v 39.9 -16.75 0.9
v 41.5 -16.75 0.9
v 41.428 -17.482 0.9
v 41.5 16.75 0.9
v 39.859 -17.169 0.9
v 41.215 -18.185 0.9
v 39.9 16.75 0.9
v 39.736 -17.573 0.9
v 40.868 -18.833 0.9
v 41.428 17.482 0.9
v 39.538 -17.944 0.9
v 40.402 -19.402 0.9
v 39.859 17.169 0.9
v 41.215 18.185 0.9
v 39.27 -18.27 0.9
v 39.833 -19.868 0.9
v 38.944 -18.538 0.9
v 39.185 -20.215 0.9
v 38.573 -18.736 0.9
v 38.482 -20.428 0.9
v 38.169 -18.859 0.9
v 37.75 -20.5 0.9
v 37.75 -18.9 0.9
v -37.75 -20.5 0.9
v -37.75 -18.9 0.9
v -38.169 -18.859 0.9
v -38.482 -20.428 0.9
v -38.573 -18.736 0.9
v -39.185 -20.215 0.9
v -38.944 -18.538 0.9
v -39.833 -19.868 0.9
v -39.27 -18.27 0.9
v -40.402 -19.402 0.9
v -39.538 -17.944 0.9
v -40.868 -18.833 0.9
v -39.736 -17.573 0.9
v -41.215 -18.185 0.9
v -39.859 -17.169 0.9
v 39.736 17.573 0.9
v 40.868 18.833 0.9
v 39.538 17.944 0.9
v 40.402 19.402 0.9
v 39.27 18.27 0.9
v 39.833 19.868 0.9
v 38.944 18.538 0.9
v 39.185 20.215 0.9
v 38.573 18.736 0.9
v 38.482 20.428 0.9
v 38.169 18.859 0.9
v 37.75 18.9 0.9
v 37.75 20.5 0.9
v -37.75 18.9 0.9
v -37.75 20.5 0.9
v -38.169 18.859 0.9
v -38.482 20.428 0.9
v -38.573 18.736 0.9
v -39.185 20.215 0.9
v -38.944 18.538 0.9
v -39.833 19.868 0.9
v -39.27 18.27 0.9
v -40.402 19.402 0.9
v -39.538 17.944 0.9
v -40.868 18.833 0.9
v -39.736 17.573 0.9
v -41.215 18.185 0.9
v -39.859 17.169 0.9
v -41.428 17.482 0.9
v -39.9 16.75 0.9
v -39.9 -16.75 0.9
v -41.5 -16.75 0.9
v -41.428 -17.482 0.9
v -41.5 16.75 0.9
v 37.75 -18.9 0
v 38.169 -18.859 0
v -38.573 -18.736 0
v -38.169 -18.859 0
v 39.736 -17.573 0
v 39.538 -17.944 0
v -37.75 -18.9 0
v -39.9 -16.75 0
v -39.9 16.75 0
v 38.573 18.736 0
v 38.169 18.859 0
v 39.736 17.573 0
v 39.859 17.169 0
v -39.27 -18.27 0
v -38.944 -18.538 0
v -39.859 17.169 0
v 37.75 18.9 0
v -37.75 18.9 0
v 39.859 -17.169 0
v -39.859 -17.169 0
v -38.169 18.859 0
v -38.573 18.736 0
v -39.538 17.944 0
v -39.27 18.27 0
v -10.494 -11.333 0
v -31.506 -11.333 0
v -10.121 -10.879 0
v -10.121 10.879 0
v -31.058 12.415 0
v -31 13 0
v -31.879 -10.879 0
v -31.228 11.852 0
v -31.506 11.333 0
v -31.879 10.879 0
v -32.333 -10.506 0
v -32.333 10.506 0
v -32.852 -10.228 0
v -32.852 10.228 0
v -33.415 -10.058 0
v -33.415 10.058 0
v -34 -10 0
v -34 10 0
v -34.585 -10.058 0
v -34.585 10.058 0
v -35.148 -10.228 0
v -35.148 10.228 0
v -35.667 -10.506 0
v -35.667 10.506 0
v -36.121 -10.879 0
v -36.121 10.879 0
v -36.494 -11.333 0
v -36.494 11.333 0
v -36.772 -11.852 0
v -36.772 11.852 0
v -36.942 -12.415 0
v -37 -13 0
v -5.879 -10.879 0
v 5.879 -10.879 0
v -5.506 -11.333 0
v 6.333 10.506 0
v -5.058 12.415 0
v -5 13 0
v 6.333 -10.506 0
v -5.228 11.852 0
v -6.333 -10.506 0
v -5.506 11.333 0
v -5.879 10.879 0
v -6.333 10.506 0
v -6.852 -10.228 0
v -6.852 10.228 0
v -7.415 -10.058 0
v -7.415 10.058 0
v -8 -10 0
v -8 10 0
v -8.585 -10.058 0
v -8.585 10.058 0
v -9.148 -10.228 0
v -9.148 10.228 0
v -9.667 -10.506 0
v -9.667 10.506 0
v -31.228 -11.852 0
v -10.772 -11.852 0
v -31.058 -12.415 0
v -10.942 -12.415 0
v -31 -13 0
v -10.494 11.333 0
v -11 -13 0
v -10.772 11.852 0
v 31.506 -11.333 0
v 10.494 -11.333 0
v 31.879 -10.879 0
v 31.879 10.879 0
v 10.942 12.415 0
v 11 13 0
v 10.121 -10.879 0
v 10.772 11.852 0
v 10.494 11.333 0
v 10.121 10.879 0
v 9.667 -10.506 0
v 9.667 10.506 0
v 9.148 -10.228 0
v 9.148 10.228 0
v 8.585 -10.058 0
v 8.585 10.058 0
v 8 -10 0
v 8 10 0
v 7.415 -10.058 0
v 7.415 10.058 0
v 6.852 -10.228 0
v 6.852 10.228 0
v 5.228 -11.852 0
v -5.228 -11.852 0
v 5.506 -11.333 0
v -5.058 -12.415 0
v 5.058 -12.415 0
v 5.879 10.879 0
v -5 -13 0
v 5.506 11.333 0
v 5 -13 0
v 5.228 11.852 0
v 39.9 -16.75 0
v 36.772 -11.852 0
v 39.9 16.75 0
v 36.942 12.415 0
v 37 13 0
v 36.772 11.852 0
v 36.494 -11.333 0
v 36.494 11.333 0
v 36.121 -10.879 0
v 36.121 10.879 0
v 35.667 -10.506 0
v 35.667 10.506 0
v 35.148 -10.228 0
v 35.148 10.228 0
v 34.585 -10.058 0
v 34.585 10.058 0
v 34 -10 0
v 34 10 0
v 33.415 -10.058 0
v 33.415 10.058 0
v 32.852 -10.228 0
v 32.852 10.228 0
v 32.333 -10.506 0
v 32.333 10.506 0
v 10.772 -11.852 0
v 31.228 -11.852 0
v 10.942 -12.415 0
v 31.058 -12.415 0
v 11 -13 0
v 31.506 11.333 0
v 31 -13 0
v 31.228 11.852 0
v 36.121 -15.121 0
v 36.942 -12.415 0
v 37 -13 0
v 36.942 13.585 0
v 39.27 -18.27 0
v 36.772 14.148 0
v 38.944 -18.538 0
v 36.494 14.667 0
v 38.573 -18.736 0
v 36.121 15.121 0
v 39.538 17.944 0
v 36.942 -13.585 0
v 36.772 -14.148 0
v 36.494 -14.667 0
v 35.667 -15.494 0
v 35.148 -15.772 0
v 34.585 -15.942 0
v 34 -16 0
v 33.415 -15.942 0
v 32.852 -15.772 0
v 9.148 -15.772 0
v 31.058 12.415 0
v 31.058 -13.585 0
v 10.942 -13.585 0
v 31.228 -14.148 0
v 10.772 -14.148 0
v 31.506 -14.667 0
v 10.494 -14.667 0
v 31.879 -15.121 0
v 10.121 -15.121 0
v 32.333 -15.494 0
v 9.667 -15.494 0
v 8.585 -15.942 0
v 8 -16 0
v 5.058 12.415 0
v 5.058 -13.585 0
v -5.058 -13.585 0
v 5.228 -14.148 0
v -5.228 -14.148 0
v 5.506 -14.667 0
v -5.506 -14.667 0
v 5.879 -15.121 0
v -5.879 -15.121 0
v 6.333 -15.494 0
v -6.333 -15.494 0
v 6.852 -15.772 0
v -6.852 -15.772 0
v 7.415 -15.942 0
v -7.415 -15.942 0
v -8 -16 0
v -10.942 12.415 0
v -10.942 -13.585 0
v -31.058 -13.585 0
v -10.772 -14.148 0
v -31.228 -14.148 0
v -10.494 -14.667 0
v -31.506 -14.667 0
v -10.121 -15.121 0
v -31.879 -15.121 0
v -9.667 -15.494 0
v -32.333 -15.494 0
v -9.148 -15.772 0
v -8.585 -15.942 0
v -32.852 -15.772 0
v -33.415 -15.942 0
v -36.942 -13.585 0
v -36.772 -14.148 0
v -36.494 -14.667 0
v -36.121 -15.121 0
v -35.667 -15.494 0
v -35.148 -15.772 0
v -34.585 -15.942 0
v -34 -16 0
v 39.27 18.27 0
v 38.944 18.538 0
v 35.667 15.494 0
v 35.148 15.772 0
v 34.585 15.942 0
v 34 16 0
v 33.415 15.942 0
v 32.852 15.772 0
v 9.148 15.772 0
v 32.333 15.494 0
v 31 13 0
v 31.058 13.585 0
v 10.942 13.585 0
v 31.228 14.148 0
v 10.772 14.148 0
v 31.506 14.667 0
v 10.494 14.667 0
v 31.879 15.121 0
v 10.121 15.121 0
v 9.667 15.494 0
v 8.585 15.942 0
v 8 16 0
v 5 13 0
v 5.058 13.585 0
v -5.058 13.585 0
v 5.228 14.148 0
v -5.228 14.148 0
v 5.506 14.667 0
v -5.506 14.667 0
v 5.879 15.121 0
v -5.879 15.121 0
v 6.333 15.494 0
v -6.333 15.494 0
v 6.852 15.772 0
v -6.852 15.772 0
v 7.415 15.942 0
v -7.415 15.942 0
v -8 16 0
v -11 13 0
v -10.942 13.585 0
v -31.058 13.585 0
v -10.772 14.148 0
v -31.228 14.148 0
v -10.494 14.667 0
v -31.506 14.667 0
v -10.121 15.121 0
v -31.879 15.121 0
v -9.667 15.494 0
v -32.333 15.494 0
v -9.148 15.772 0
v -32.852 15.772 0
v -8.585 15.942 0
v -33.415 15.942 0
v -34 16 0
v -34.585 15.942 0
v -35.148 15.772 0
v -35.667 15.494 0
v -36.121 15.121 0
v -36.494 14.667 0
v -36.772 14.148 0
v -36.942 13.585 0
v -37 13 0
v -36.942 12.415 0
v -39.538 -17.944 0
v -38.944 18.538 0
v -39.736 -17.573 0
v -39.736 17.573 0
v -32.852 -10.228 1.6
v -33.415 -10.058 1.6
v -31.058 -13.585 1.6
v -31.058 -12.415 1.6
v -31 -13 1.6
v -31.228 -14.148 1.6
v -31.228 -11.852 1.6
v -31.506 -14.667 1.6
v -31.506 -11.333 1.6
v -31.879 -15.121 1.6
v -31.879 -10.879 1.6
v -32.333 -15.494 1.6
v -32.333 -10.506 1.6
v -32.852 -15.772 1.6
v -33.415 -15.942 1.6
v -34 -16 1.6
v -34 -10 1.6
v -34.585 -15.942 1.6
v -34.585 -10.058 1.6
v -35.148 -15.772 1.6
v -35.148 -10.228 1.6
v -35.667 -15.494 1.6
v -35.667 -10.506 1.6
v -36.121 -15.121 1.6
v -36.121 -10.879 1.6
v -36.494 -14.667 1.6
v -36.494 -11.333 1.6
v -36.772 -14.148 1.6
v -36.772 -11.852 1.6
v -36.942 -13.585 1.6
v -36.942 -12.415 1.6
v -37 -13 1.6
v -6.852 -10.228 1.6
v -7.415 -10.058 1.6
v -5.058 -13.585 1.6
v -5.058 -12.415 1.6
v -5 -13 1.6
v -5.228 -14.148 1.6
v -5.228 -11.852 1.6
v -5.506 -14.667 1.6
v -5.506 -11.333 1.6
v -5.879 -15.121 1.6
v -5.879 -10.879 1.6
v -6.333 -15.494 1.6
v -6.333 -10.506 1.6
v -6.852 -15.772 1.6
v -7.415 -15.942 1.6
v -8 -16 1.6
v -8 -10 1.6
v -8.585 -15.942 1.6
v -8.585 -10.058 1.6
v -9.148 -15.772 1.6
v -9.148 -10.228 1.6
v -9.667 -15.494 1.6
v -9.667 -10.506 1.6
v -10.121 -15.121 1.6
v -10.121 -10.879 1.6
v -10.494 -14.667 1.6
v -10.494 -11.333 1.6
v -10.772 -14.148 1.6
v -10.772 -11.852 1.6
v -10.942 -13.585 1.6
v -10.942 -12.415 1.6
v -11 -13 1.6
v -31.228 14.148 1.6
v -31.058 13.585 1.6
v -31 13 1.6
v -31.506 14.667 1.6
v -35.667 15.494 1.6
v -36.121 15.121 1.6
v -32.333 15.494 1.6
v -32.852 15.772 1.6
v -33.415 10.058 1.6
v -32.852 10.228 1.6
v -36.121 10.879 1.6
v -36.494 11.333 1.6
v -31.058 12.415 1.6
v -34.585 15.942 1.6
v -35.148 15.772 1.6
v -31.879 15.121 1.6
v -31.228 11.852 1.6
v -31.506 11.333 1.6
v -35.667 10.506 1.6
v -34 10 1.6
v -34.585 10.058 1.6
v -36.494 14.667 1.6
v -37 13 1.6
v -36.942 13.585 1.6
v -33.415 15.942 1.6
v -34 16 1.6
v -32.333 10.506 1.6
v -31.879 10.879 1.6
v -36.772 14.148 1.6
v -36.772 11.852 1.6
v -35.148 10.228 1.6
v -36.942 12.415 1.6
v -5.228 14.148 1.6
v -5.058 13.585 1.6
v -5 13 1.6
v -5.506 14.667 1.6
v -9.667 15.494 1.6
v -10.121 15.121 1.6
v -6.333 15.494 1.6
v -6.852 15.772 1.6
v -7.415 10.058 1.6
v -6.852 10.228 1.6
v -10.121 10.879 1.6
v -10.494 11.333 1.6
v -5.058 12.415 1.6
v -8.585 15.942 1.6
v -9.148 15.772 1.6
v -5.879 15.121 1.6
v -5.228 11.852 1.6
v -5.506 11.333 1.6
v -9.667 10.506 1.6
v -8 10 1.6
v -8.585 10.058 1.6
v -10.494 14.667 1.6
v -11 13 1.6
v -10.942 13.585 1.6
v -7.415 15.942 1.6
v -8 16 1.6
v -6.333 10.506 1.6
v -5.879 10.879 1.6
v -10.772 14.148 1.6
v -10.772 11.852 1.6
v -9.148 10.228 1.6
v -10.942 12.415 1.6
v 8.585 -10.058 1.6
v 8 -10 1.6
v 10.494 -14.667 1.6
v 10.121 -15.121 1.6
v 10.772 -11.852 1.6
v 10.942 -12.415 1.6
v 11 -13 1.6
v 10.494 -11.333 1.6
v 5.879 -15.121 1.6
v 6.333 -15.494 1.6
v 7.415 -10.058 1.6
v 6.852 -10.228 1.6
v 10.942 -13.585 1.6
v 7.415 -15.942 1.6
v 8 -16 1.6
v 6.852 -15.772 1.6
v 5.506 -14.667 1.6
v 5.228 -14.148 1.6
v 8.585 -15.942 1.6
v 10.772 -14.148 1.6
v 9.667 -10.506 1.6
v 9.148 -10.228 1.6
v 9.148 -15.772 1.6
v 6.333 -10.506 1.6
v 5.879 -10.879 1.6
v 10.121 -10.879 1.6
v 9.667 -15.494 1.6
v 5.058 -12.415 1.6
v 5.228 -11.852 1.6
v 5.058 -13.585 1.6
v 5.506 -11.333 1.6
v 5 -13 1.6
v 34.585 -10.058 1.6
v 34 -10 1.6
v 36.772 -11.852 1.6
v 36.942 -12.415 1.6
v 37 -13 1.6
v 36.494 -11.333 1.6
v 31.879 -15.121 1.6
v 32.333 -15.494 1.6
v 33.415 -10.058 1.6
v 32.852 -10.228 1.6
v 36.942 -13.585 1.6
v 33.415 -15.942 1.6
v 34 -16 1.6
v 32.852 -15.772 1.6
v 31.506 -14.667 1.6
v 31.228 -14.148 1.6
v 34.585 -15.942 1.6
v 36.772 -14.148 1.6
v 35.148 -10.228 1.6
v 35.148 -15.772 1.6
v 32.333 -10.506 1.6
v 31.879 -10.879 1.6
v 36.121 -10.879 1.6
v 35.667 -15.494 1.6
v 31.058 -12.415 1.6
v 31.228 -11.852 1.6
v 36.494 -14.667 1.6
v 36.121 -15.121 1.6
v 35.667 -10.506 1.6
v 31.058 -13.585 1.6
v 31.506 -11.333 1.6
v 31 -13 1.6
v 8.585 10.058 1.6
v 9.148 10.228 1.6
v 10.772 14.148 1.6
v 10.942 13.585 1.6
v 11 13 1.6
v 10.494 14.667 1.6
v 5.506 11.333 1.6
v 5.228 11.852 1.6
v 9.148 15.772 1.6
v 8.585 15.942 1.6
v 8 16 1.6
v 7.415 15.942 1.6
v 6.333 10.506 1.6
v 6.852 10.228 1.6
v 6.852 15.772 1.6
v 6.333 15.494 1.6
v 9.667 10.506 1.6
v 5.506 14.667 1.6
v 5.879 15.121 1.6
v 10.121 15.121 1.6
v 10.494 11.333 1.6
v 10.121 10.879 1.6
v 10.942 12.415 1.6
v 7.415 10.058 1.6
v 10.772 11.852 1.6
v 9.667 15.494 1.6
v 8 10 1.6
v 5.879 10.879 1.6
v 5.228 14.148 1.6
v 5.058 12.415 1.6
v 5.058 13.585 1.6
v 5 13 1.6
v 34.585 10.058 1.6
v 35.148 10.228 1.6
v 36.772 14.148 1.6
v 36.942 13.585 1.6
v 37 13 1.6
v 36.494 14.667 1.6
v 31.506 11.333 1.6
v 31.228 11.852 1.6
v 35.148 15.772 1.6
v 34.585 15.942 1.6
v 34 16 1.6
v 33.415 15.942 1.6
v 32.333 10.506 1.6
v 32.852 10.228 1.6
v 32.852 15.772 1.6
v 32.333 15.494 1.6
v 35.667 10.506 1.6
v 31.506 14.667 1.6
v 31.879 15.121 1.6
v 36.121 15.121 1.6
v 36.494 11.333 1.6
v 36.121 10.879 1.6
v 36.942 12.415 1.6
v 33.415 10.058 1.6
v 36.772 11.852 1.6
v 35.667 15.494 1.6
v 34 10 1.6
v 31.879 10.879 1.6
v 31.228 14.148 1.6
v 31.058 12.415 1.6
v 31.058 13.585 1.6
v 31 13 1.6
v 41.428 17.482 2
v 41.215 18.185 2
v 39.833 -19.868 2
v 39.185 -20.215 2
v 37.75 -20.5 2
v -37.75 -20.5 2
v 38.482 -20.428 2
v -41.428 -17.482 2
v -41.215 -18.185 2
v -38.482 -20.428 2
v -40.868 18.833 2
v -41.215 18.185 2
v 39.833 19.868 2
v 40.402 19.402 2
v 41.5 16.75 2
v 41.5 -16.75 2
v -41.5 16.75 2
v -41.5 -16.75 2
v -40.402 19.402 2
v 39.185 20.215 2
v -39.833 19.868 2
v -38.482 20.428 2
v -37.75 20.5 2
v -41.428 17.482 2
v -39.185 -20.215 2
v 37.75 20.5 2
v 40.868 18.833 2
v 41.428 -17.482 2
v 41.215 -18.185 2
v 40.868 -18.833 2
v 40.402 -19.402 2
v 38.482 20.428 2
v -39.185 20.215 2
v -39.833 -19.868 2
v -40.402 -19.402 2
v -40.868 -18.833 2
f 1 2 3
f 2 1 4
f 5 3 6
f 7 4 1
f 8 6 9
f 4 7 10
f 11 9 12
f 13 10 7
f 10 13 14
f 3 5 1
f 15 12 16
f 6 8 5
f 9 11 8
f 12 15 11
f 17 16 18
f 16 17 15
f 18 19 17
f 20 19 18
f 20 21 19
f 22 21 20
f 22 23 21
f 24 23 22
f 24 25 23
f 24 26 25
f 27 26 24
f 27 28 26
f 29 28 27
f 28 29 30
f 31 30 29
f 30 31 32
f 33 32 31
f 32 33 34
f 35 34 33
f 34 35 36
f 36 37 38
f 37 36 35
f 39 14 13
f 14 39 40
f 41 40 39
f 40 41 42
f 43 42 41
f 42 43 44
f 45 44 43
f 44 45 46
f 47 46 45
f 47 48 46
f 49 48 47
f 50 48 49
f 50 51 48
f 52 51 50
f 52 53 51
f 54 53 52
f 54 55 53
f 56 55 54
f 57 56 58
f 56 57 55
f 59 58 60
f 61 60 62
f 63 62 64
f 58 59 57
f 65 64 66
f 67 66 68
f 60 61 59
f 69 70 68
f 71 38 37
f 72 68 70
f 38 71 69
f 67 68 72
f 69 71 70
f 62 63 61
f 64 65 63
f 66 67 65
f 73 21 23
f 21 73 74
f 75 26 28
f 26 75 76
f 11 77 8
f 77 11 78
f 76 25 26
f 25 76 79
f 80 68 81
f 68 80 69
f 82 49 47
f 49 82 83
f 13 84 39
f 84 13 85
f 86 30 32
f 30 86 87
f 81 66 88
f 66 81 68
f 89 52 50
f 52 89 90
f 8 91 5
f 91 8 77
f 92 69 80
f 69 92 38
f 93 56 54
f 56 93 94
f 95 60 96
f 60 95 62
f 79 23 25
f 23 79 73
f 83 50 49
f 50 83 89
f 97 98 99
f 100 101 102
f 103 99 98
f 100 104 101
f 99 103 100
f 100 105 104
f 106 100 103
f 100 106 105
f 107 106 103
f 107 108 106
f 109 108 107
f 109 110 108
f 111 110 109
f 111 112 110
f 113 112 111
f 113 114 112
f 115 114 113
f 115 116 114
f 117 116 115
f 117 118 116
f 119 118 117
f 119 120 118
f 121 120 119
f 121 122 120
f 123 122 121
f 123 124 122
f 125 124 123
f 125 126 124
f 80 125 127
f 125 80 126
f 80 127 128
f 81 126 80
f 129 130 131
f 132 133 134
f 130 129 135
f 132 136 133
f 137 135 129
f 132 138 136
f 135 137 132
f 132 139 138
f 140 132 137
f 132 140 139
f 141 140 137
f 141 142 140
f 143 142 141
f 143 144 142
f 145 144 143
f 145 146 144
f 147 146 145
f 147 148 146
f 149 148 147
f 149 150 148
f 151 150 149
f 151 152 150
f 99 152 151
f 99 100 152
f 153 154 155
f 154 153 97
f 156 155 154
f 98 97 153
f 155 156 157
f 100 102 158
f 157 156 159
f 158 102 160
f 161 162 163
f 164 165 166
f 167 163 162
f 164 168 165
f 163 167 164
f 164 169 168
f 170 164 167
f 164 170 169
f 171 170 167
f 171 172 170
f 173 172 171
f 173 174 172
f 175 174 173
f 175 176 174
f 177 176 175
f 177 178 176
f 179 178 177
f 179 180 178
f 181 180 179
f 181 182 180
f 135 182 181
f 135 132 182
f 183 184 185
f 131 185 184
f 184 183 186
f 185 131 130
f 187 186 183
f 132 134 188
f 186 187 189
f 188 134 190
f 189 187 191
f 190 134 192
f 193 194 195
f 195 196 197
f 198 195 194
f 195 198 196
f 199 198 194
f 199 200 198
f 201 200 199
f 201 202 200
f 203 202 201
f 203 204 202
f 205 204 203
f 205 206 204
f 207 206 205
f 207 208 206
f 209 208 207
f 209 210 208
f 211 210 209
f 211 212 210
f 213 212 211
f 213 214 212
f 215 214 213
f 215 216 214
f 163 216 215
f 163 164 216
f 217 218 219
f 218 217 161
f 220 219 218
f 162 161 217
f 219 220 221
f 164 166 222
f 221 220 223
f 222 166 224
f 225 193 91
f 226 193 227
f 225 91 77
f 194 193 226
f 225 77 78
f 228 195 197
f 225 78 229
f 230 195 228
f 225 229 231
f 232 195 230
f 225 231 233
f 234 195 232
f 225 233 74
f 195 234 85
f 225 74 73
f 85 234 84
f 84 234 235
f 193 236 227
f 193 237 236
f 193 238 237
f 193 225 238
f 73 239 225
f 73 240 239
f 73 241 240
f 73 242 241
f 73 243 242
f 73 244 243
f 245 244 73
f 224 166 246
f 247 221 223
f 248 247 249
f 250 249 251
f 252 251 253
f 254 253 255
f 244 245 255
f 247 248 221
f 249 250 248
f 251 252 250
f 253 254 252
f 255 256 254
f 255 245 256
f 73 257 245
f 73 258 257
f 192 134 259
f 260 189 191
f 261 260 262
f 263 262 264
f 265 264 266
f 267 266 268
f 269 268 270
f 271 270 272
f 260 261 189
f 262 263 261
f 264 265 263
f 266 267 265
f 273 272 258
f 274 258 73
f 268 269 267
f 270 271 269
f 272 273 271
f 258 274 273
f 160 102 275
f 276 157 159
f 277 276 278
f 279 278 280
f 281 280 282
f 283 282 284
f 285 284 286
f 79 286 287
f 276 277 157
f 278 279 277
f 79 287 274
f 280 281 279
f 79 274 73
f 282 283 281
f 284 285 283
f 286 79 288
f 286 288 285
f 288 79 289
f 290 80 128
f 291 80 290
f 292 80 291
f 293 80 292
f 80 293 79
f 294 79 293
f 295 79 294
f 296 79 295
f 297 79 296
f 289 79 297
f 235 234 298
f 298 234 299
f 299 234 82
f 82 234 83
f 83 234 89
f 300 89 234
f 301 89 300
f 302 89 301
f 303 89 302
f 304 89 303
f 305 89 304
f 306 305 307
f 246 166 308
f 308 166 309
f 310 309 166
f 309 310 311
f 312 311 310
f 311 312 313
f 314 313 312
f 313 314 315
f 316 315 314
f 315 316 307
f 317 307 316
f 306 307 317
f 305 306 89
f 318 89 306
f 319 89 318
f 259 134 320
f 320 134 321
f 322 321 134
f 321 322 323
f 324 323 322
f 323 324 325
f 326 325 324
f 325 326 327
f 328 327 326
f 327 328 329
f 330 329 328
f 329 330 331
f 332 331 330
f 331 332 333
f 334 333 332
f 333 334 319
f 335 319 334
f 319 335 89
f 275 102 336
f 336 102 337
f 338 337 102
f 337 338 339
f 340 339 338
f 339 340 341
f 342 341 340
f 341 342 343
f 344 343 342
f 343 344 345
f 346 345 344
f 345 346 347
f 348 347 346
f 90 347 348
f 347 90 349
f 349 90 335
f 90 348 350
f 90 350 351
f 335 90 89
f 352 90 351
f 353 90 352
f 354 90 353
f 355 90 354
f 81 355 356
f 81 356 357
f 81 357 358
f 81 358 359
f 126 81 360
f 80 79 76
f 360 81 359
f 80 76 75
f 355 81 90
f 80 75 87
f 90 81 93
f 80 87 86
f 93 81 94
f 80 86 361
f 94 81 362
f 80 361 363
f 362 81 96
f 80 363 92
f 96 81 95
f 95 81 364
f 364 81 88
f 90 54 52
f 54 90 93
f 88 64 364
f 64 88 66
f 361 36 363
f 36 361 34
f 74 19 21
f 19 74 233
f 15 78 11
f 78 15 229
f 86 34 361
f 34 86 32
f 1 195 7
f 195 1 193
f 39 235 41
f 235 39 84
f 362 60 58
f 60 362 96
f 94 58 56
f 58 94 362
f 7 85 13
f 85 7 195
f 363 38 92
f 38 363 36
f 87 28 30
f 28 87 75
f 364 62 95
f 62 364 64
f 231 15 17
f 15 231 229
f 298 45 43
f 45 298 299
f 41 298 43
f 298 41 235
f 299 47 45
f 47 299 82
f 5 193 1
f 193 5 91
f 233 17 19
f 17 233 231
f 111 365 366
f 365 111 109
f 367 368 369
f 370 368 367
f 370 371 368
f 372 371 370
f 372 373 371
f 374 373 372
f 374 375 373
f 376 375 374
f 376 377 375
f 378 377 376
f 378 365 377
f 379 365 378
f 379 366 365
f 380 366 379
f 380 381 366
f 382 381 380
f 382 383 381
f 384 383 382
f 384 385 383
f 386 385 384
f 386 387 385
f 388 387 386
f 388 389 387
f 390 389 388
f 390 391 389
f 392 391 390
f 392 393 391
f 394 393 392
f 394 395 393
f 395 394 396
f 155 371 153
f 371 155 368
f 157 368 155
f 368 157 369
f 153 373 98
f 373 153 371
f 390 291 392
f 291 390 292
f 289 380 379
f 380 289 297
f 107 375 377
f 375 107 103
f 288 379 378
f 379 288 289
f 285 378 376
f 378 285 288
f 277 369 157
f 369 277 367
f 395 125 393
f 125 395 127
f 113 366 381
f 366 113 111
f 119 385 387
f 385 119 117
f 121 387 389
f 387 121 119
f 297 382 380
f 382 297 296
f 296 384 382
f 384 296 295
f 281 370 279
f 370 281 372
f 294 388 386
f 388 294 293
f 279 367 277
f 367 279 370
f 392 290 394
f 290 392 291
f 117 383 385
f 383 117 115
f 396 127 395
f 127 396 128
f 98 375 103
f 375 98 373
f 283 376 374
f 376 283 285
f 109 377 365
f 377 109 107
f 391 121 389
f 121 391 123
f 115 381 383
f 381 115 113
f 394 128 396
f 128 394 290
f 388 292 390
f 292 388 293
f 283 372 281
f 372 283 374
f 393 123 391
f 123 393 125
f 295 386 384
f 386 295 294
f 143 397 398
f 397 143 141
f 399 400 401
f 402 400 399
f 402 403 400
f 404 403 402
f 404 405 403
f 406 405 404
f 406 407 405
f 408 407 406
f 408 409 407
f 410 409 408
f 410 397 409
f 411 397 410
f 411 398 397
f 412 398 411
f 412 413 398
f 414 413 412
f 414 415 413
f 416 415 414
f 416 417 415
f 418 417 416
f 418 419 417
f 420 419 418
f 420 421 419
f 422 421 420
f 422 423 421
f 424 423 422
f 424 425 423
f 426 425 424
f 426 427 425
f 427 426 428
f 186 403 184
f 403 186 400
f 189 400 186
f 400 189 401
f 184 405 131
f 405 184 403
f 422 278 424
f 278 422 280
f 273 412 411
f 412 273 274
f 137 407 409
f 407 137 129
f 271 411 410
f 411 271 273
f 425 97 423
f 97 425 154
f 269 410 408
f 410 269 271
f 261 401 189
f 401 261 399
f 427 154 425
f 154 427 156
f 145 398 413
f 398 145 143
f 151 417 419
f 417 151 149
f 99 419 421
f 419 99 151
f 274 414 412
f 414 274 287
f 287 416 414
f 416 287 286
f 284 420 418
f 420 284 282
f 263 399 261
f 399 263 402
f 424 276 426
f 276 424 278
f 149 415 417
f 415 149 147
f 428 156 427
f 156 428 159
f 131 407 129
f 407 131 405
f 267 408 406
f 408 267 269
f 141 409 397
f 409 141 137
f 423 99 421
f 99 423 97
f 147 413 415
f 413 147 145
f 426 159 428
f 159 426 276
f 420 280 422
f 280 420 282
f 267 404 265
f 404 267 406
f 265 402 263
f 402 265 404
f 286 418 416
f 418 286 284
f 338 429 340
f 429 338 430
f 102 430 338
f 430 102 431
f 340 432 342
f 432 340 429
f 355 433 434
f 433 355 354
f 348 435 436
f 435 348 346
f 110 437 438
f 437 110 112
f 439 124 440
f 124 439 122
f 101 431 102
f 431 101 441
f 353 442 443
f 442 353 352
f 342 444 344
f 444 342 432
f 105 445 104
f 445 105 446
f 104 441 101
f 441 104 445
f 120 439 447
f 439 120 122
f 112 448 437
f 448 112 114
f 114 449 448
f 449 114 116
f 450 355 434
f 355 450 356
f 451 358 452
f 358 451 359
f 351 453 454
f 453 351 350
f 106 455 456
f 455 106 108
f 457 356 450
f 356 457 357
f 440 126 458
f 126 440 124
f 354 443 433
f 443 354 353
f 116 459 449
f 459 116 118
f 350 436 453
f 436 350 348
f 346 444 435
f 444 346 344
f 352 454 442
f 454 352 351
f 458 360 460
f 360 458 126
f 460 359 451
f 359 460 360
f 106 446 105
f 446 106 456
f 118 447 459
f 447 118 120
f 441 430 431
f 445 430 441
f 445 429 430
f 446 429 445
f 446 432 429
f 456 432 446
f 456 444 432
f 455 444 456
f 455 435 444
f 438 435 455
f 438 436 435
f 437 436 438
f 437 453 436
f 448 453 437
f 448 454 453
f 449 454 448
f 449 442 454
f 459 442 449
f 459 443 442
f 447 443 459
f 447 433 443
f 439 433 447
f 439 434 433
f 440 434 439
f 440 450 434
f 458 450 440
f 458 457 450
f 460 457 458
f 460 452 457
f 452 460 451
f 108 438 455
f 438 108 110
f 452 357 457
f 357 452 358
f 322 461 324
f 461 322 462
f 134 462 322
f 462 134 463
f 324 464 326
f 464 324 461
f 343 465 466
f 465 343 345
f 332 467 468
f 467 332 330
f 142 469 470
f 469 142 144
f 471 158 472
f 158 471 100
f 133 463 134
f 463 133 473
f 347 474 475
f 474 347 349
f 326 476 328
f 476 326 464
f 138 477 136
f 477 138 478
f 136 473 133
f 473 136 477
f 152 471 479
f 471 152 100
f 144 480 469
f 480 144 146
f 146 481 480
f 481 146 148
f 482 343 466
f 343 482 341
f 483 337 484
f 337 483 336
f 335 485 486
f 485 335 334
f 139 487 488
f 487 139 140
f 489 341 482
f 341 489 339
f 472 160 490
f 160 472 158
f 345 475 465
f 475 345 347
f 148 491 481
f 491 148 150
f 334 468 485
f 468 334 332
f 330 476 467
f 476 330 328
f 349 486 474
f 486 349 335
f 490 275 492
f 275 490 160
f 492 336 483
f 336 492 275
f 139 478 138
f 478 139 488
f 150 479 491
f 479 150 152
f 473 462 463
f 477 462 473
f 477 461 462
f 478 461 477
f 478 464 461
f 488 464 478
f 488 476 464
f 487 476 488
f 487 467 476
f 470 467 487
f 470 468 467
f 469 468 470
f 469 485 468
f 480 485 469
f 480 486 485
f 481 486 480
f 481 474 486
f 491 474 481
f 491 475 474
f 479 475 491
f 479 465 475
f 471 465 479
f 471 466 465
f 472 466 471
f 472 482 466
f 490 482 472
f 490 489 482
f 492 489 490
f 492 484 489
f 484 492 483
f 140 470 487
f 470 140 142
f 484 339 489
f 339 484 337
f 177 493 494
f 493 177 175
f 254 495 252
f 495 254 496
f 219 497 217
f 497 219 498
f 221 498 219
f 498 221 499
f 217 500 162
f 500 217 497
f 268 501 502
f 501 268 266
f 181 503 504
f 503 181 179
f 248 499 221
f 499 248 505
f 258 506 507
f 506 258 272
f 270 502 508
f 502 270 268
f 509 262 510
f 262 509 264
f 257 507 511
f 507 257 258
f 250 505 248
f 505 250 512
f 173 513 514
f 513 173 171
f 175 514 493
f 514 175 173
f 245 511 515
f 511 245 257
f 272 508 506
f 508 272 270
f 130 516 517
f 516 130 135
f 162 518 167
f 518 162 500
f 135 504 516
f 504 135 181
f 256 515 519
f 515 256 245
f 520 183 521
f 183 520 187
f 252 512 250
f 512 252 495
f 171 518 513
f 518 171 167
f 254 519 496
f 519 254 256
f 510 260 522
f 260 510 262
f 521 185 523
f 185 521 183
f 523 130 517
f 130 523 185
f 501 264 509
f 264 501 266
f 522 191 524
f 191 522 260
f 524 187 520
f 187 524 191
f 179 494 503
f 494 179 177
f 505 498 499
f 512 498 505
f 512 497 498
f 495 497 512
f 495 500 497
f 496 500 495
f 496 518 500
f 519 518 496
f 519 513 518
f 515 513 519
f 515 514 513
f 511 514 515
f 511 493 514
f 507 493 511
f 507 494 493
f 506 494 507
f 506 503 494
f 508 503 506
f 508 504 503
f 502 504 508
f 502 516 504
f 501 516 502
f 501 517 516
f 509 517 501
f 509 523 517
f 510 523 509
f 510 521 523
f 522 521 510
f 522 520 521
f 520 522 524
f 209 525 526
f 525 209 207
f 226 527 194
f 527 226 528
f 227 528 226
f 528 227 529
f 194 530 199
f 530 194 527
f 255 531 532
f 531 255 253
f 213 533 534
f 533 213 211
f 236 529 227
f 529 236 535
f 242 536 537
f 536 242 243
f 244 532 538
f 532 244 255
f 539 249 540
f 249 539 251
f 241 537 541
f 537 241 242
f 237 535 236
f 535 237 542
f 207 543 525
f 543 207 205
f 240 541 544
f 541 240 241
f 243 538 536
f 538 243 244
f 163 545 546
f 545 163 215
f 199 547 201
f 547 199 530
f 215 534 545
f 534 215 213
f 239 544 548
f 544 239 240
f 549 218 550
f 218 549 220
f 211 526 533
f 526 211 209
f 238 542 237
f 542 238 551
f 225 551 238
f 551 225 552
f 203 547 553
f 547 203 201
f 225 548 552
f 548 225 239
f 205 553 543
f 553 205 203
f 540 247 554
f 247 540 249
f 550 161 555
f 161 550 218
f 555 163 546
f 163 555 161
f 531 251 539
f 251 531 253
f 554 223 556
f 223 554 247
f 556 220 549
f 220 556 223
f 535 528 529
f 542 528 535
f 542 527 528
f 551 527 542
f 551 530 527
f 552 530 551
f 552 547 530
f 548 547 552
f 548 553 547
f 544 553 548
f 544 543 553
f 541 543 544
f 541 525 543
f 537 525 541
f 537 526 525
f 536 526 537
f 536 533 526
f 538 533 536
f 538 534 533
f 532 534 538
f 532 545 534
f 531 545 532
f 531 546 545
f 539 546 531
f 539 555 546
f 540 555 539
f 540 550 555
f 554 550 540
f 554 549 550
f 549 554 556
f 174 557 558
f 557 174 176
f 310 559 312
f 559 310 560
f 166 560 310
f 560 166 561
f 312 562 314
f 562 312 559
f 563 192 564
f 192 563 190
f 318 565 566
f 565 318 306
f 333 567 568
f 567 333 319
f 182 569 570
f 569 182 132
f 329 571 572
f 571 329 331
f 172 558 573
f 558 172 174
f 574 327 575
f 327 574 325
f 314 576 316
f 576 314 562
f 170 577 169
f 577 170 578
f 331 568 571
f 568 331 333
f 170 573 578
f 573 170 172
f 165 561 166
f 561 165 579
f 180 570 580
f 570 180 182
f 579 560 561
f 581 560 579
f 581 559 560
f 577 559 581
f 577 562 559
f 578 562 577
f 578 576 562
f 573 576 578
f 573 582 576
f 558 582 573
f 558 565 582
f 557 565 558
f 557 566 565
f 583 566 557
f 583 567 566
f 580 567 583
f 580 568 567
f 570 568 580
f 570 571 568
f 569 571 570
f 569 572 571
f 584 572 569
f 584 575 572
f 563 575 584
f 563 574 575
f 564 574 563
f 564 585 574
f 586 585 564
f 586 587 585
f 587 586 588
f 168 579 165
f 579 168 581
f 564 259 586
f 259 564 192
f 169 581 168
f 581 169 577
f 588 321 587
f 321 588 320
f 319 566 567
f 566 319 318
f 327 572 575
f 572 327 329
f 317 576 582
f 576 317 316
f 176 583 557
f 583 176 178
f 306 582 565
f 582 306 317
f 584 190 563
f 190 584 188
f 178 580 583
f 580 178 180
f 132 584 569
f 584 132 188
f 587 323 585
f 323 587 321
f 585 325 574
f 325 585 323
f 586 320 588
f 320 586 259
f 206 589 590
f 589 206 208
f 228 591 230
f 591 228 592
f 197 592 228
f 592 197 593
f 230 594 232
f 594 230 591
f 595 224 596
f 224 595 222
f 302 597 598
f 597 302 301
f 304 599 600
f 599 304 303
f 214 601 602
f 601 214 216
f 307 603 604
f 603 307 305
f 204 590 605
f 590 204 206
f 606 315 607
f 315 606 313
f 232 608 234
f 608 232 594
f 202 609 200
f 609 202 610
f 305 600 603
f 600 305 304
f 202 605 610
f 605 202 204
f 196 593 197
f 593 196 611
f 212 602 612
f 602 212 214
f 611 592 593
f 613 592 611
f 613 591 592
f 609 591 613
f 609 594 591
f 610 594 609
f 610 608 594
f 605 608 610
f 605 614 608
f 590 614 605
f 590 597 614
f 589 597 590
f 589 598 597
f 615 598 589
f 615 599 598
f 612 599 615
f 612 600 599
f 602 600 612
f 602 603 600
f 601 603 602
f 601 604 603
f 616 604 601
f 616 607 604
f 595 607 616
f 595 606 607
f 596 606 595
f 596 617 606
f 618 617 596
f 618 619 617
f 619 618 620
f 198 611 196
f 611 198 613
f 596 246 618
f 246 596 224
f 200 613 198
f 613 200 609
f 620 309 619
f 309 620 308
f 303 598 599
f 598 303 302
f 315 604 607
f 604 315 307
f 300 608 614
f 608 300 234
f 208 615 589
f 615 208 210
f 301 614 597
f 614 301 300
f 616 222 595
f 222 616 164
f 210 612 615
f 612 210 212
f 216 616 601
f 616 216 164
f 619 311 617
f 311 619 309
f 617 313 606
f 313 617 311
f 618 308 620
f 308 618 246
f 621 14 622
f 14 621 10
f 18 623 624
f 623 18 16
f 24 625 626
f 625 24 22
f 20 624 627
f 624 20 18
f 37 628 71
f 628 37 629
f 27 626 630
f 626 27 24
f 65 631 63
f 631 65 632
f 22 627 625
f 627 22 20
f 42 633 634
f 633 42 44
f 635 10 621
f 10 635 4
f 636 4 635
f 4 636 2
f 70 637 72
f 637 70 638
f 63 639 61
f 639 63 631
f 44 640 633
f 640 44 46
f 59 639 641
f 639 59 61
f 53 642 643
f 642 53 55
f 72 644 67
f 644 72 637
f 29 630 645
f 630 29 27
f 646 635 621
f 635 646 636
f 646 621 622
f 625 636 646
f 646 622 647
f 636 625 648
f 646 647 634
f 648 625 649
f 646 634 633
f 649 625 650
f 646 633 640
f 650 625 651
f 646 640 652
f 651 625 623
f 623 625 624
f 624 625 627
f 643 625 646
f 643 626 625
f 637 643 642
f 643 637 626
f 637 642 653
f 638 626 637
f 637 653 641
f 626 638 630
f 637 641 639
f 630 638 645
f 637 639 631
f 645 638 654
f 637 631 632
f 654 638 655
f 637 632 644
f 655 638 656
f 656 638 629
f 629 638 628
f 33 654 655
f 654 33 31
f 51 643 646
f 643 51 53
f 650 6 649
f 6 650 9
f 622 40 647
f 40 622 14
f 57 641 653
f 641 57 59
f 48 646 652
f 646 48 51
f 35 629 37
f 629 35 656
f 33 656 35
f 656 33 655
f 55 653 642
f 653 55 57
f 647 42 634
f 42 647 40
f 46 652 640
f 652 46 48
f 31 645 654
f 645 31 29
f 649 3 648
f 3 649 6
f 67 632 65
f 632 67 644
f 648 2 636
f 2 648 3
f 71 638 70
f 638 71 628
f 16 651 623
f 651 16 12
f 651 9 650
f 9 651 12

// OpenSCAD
// file: gridfinity_std.scad
// ============================================================================
// gridfinity_std.scad — shared Gridfinity geometry for the OpenSCAD-engine
// modes of the `gridfinity` cartridge (cup / baseplate_scad / lid).
//
// CLEAN-ROOM PROVENANCE
//   Authored by Innovaciones MADFAM for the MADFAM Open Commons Hyperobjects
//   collection under CERN-OHL-W-2.0. Written from the publicly documented
//   Gridfinity specification (gridfinity.xyz, Zack Freedman / Voidstar Lab)
//   and from a recorded measurement baseline of the cartridge's own manifest
//   contract. No prior implementation of Gridfinity — in this repository, in
//   any archived satellite, or upstream — was read, consulted or copied while
//   writing this file. See ../NOTICE and docs/CLEANROOM-VERIFICATION.md.
//
// THE STANDARD IMPLEMENTED HERE
//   Grid module      42.0 mm in X and Y; one "unit" of footprint.
//   Height unit       7.0 mm in Z.
//   Bin footprint    42*n - 0.5 mm  (0.5 mm total clearance per pitch, so
//                    neighbouring bins in a drawer do not bind).
//   Corner radius     3.75 mm at the widest point of the profile.
//   Base profile     a three-step chamfer stack, bottom-up:
//                        0.80 mm chamfer at 45 deg
//                        1.80 mm straight wall
//                        2.15 mm chamfer at 45 deg
//                    = 4.75 mm; each 45 deg chamfer narrows the section by its
//                    own height on every side, so for a 41.5 mm cell the
//                    sections are 35.6 / 37.2 / 37.2 / 41.5 mm.
//   Foot height       5.00 mm: the 4.75 mm profile plus a 0.25 mm straight
//                    riser at full width, which is where the body starts.
//   Stacking lip     the same profile repeated at the top of a bin, so the
//                    foot of the bin above nests into it.
//   Socket clearance 0.25 mm nominal (0.125 mm per side), so a foot topping
//                    out at 41.5 mm enters a 41.75 mm socket mouth and the
//                    sockets of adjacent cells keep a 0.25 mm rib between them.
//   Magnet socket     6 mm dia x 2 mm deep, on a 26 x 26 mm square about the
//                    cell centre.
//   Screw hole       M3 clearance (3.4 mm), coaxial with the magnet sockets.
// ============================================================================

// No library include. Every primitive this cartridge needs — a rounded
// rectangle, a hull between two sections, a cylinder — is an OpenSCAD builtin,
// so the three modes render with nothing on OPENSCADPATH. BOSL2 (BSD-2-Clause)
// is available in the commons at libs/BOSL2 and would have been permitted, but
// declaring a dependency this code does not use would be a false statement
// about what it needs.

// -- Canonical constants -----------------------------------------------------
GF_PITCH        = 42.0;   // grid module, X and Y
GF_ZUNIT        =  7.0;   // height unit
GF_CLEAR        =  0.5;   // total bin clearance per pitch
GF_CELL         = GF_PITCH - GF_CLEAR;   // 41.5 mm, the bin's per-cell width
GF_R            =  3.75;  // corner radius at the widest section

GF_C1           =  0.80;  // lower chamfer height (45 deg)
GF_WALL         =  1.80;  // middle straight section
GF_C2           =  2.15;  // upper chamfer height (45 deg)
GF_PROFILE_H    = GF_C1 + GF_WALL + GF_C2;   // 4.75 mm
GF_RISER        =  0.25;  // straight riser above the profile
GF_FOOT_H       = GF_PROFILE_H + GF_RISER;   // 5.00 mm

GF_SOCKET_CLEAR =  0.125; // per side; 0.25 mm nominal diametral clearance

GF_MAG_D        =  6.0;   // magnet diameter
GF_MAG_H        =  2.0;   // magnet depth
GF_MAG_PITCH    = 26.0;   // magnet centres, square about the cell centre
GF_SCREW_D      =  3.4;   // M3 clearance

GF_LID_CLEAR    =  1.0;   // total lid clearance per pitch -> 42*n - 1.0

// Resolve the manifest's `fn` parameter. The manifest documents 0 as "auto";
// auto is 32, the value the platform's other rounded cartridges use.
function gf_fn(fn) = fn > 0 ? fn : 32;

// -- Rounded-rectangle prism -------------------------------------------------
// A prism of size [x, y] and height h, base at z = 0, centred in X and Y, with
// vertical edges filleted to radius r. r is clamped so it can never exceed half
// the shorter side.
module gf_rrect(x, y, h, r) {
    rr = max(0.01, min(r, min(x, y) / 2 - 0.001));
    linear_extrude(height = max(0.001, h))
        offset(r = rr) offset(r = -rr)
            square([max(0.02, x), max(0.02, y)], center = true);
}

// -- The base profile as a solid of revolution-free extrusion ----------------
// One cell's foot, base at z = 0, built as four stacked sections. `grow` widens
// every section on each side (used to make the baseplate socket, which is this
// same profile enlarged by the clearance).
//
//   z 0.00 .. 0.80   chamfer: (top - 2*C2 - 2*C1) -> (top - 2*C2)
//   z 0.80 .. 2.60   straight at (top - 2*C2)
//   z 2.60 .. 4.75   chamfer: (top - 2*C2) -> top
//   z 4.75 .. 5.00   straight at top
//
// The corner radius tracks the width so the fillet keeps a constant offset from
// the corner: r shrinks by the same amount the section does.
module gf_foot_profile(grow = 0, with_riser = true) {
    w_top = GF_CELL      + 2 * grow;
    w_mid = w_top - 2 * GF_C2;
    w_bot = w_mid - 2 * GF_C1;

    r_top = GF_R          + grow;
    r_mid = max(0.01, r_top - GF_C2);
    r_bot = max(0.01, r_mid - GF_C1);

    // lower chamfer
    hull() {
        gf_rrect(w_bot, w_bot, 0.001, r_bot);
        translate([0, 0, GF_C1]) gf_rrect(w_mid, w_mid, 0.001, r_mid);
    }
    // straight middle
    translate([0, 0, GF_C1]) gf_rrect(w_mid, w_mid, GF_WALL, r_mid);
    // upper chamfer
    translate([0, 0, GF_C1 + GF_WALL]) hull() {
        gf_rrect(w_mid, w_mid, 0.001, r_mid);
        translate([0, 0, GF_C2]) gf_rrect(w_top, w_top, 0.001, r_top);
    }
    // riser to the full 5 mm foot height
    if (with_riser)
        translate([0, 0, GF_PROFILE_H]) gf_rrect(w_top, w_top, GF_RISER, r_top);
}

// -- Grid helpers ------------------------------------------------------------
// Centre of cell (ix, iy) in a nx x ny grid, the whole grid centred on origin.
function gf_cell_x(ix, nx) = (ix - (nx - 1) / 2) * GF_PITCH;
function gf_cell_y(iy, ny) = (iy - (ny - 1) / 2) * GF_PITCH;

// The bin's overall footprint.
function gf_body_x(nx) = nx * GF_PITCH - GF_CLEAR;
function gf_body_y(ny) = ny * GF_PITCH - GF_CLEAR;

// The four magnet/screw centres of one cell, relative to the cell centre.
function gf_mag_offsets() = [
    [-GF_MAG_PITCH / 2, -GF_MAG_PITCH / 2],
    [ GF_MAG_PITCH / 2, -GF_MAG_PITCH / 2],
    [-GF_MAG_PITCH / 2,  GF_MAG_PITCH / 2],
    [ GF_MAG_PITCH / 2,  GF_MAG_PITCH / 2],
];
// main file
// ============================================================================
// lid.scad — Gridfinity bin lid, OpenSCAD engine, mode `lid`.
//
// CLEAN-ROOM PROVENANCE
//   Authored by Innovaciones MADFAM for the MADFAM Open Commons Hyperobjects
//   collection under CERN-OHL-W-2.0, from the publicly documented Gridfinity
//   specification (gridfinity.xyz, Zack Freedman / Voidstar Lab) and from a
//   recorded measurement baseline of this cartridge's own manifest contract.
//   No prior Gridfinity implementation — in this repository's history, in any
//   archived satellite, or upstream — was read or consulted while writing it.
//   No third-party library is used: every primitive is an OpenSCAD
//   builtin. See ../NOTICE.
//
// WHAT THIS LID DOES THAT THE BASELINE'S DID NOT
//   The baseline lid was a featureless flat plate: no recess, no rim, no
//   magnets, and its four declared parameters changed nothing. It could not
//   retain on a bin. This one has a real fit recess.
//
//   The lid's footprint is 42*n - 1.0 mm, i.e. 0.25 mm inset per side relative
//   to the bin it covers (42*n - 0.5). That inset is the ONLY fit dimension the
//   standard and the measured baseline together supply, so it is what the fit
//   is built from: the lid drops INSIDE the bin's stacking-lip recess, and a
//   step machined into the lid's underside registers against the lip's inner
//   face. Plate thickness stays 2.0 mm and the footprint rule is unchanged, so
//   the envelope is identical to the baseline's at every variant; the recess is
//   cut into that envelope, never added outside it.
// ============================================================================

include <gridfinity_std.scad>

// -- Manifest parameters (injected with -D by the platform) ------------------
width_units         = 2;     // grid units in X            [1 .. 6]
depth_units         = 1;     // grid units in Y            [1 .. 6]
lid_include_magnets = 1;     // 6 x 2 mm magnet cavities in the underside
lid_efficient_floor = 0.7;   // membrane left under the relief  [0.4 .. 2]
lid_type_id         = 0;     // 0 default, 1 flat, 2 halfpitch, 3 efficient
fn                  = 0;     // 0 = auto (32)

$fn = gf_fn(fn);

// -- Derived ------------------------------------------------------------------
nx = max(1, min(6, round(width_units)));
ny = max(1, min(6, round(depth_units)));

// Footprint rule 42*n - 1.0: 0.25 mm inset per side vs the bin's 42*n - 0.5.
lid_x = nx * GF_PITCH - GF_LID_CLEAR;
lid_y = ny * GF_PITCH - GF_LID_CLEAR;
lid_h = 2.0;                 // plate thickness, the baseline envelope

floor_th = max(0.4, min(2.0, lid_efficient_floor));

// -- Lid types ----------------------------------------------------------------
//   0 default    a registration step around the underside: the lid seats
//                inside the bin's stacking-lip recess and cannot slide off.
//   1 flat       no step — the plain plate, for a bin whose lip is disabled
//                (lip_style_id = 3) or for use as a divider shim.
//   2 halfpitch  the step, plus a half-pitch alignment ridge across the middle
//                of the underside, which drops between two bins pushed
//                together so one lid spans both.
//   3 efficient  the step, plus a relief pocket per cell in the TOP face that
//                leaves `lid_efficient_floor` of membrane — a lighter lid.
has_step  = lid_type_id != 1;
has_ridge = lid_type_id == 2;
has_relief = lid_type_id == 3;

// The registration step. Its outer face sits at the lid footprint; it is
// recessed `step_in` from the edge and `step_h` deep into the underside, so
// what remains standing is a spigot that enters the bin's lip recess.
step_in = 1.6;
step_h  = min(0.9, lid_h - 0.6);

// ============================================================================
// Registration step — cut a rebate around the underside perimeter
// ============================================================================
module lid_step() {
    if (has_step && step_h > 0.1)
        difference() {
            translate([0, 0, -0.01])
                gf_rrect(lid_x + 0.02, lid_y + 0.02, step_h + 0.01, GF_R);
            gf_rrect(lid_x - 2 * step_in, lid_y - 2 * step_in,
                     step_h + 0.4, max(0.01, GF_R - step_in));
        }
}

// ============================================================================
// Half-pitch alignment ridge — a rib across the underside on the cell boundary
// ============================================================================
module lid_ridge() {
    if (has_ridge) {
        rw = 2.0;                       // rib width
        rh = min(0.8, lid_h - 0.8);     // rib depth into the underside
        if (rh > 0.1) {
            // ribs on every internal cell boundary in X
            if (nx > 1)
                for (i = [1 : nx - 1])
                    translate([-lid_x / 2 + i * lid_x / nx, 0, -0.01])
                        cube([rw, lid_y + 0.02, rh + 0.01], center = true);
            if (ny > 1)
                for (j = [1 : ny - 1])
                    translate([0, -lid_y / 2 + j * lid_y / ny, -0.01])
                        cube([lid_x + 0.02, rw, rh + 0.01], center = true);
            // a single centre rib when the lid is one cell either way, so the
            // parameter is never silently inert
            if (nx == 1 && ny == 1)
                translate([0, 0, -0.01])
                    cube([lid_x + 0.02, rw, rh + 0.01], center = true);
        }
    }
}

// ============================================================================
// Efficient relief — pocket the TOP face per cell, leaving a membrane
// ============================================================================
module lid_relief() {
    if (has_relief) {
        depth = lid_h - floor_th;
        if (depth > 0.15)
            for (ix = [0 : nx - 1], iy = [0 : ny - 1])
                translate([gf_cell_x(ix, nx), gf_cell_y(iy, ny),
                           lid_h - depth])
                    gf_rrect(GF_CELL - 6, GF_CELL - 6, depth + 0.01, GF_R);
    }
}

// ============================================================================
// Magnet cavities — in the underside, on the standard 26 mm square, so the lid
// is held to a bin whose own feet carry magnets.
//
// Their depth is capped so a 2 mm plate is never perforated: a 6 x 2 mm magnet
// needs 2 mm, which is the whole plate, so the pocket is limited to leave at
// least 0.4 mm of material and the lid still holds on the magnet's face.
// ============================================================================
module lid_magnets() {
    if (lid_include_magnets > 0) {
        d = min(GF_MAG_H, lid_h - 0.4);
        if (d > 0.15)
            for (ix = [0 : nx - 1], iy = [0 : ny - 1])
                for (o = gf_mag_offsets())
                    translate([gf_cell_x(ix, nx) + o[0],
                               gf_cell_y(iy, ny) + o[1], -0.01])
                        cylinder(d = GF_MAG_D, h = d + 0.01);
    }
}

// ============================================================================
// Assembly
// ============================================================================
difference() {
    gf_rrect(lid_x, lid_y, lid_h, GF_R);
    lid_step();
    lid_ridge();
    lid_relief();
    lid_magnets();
}
